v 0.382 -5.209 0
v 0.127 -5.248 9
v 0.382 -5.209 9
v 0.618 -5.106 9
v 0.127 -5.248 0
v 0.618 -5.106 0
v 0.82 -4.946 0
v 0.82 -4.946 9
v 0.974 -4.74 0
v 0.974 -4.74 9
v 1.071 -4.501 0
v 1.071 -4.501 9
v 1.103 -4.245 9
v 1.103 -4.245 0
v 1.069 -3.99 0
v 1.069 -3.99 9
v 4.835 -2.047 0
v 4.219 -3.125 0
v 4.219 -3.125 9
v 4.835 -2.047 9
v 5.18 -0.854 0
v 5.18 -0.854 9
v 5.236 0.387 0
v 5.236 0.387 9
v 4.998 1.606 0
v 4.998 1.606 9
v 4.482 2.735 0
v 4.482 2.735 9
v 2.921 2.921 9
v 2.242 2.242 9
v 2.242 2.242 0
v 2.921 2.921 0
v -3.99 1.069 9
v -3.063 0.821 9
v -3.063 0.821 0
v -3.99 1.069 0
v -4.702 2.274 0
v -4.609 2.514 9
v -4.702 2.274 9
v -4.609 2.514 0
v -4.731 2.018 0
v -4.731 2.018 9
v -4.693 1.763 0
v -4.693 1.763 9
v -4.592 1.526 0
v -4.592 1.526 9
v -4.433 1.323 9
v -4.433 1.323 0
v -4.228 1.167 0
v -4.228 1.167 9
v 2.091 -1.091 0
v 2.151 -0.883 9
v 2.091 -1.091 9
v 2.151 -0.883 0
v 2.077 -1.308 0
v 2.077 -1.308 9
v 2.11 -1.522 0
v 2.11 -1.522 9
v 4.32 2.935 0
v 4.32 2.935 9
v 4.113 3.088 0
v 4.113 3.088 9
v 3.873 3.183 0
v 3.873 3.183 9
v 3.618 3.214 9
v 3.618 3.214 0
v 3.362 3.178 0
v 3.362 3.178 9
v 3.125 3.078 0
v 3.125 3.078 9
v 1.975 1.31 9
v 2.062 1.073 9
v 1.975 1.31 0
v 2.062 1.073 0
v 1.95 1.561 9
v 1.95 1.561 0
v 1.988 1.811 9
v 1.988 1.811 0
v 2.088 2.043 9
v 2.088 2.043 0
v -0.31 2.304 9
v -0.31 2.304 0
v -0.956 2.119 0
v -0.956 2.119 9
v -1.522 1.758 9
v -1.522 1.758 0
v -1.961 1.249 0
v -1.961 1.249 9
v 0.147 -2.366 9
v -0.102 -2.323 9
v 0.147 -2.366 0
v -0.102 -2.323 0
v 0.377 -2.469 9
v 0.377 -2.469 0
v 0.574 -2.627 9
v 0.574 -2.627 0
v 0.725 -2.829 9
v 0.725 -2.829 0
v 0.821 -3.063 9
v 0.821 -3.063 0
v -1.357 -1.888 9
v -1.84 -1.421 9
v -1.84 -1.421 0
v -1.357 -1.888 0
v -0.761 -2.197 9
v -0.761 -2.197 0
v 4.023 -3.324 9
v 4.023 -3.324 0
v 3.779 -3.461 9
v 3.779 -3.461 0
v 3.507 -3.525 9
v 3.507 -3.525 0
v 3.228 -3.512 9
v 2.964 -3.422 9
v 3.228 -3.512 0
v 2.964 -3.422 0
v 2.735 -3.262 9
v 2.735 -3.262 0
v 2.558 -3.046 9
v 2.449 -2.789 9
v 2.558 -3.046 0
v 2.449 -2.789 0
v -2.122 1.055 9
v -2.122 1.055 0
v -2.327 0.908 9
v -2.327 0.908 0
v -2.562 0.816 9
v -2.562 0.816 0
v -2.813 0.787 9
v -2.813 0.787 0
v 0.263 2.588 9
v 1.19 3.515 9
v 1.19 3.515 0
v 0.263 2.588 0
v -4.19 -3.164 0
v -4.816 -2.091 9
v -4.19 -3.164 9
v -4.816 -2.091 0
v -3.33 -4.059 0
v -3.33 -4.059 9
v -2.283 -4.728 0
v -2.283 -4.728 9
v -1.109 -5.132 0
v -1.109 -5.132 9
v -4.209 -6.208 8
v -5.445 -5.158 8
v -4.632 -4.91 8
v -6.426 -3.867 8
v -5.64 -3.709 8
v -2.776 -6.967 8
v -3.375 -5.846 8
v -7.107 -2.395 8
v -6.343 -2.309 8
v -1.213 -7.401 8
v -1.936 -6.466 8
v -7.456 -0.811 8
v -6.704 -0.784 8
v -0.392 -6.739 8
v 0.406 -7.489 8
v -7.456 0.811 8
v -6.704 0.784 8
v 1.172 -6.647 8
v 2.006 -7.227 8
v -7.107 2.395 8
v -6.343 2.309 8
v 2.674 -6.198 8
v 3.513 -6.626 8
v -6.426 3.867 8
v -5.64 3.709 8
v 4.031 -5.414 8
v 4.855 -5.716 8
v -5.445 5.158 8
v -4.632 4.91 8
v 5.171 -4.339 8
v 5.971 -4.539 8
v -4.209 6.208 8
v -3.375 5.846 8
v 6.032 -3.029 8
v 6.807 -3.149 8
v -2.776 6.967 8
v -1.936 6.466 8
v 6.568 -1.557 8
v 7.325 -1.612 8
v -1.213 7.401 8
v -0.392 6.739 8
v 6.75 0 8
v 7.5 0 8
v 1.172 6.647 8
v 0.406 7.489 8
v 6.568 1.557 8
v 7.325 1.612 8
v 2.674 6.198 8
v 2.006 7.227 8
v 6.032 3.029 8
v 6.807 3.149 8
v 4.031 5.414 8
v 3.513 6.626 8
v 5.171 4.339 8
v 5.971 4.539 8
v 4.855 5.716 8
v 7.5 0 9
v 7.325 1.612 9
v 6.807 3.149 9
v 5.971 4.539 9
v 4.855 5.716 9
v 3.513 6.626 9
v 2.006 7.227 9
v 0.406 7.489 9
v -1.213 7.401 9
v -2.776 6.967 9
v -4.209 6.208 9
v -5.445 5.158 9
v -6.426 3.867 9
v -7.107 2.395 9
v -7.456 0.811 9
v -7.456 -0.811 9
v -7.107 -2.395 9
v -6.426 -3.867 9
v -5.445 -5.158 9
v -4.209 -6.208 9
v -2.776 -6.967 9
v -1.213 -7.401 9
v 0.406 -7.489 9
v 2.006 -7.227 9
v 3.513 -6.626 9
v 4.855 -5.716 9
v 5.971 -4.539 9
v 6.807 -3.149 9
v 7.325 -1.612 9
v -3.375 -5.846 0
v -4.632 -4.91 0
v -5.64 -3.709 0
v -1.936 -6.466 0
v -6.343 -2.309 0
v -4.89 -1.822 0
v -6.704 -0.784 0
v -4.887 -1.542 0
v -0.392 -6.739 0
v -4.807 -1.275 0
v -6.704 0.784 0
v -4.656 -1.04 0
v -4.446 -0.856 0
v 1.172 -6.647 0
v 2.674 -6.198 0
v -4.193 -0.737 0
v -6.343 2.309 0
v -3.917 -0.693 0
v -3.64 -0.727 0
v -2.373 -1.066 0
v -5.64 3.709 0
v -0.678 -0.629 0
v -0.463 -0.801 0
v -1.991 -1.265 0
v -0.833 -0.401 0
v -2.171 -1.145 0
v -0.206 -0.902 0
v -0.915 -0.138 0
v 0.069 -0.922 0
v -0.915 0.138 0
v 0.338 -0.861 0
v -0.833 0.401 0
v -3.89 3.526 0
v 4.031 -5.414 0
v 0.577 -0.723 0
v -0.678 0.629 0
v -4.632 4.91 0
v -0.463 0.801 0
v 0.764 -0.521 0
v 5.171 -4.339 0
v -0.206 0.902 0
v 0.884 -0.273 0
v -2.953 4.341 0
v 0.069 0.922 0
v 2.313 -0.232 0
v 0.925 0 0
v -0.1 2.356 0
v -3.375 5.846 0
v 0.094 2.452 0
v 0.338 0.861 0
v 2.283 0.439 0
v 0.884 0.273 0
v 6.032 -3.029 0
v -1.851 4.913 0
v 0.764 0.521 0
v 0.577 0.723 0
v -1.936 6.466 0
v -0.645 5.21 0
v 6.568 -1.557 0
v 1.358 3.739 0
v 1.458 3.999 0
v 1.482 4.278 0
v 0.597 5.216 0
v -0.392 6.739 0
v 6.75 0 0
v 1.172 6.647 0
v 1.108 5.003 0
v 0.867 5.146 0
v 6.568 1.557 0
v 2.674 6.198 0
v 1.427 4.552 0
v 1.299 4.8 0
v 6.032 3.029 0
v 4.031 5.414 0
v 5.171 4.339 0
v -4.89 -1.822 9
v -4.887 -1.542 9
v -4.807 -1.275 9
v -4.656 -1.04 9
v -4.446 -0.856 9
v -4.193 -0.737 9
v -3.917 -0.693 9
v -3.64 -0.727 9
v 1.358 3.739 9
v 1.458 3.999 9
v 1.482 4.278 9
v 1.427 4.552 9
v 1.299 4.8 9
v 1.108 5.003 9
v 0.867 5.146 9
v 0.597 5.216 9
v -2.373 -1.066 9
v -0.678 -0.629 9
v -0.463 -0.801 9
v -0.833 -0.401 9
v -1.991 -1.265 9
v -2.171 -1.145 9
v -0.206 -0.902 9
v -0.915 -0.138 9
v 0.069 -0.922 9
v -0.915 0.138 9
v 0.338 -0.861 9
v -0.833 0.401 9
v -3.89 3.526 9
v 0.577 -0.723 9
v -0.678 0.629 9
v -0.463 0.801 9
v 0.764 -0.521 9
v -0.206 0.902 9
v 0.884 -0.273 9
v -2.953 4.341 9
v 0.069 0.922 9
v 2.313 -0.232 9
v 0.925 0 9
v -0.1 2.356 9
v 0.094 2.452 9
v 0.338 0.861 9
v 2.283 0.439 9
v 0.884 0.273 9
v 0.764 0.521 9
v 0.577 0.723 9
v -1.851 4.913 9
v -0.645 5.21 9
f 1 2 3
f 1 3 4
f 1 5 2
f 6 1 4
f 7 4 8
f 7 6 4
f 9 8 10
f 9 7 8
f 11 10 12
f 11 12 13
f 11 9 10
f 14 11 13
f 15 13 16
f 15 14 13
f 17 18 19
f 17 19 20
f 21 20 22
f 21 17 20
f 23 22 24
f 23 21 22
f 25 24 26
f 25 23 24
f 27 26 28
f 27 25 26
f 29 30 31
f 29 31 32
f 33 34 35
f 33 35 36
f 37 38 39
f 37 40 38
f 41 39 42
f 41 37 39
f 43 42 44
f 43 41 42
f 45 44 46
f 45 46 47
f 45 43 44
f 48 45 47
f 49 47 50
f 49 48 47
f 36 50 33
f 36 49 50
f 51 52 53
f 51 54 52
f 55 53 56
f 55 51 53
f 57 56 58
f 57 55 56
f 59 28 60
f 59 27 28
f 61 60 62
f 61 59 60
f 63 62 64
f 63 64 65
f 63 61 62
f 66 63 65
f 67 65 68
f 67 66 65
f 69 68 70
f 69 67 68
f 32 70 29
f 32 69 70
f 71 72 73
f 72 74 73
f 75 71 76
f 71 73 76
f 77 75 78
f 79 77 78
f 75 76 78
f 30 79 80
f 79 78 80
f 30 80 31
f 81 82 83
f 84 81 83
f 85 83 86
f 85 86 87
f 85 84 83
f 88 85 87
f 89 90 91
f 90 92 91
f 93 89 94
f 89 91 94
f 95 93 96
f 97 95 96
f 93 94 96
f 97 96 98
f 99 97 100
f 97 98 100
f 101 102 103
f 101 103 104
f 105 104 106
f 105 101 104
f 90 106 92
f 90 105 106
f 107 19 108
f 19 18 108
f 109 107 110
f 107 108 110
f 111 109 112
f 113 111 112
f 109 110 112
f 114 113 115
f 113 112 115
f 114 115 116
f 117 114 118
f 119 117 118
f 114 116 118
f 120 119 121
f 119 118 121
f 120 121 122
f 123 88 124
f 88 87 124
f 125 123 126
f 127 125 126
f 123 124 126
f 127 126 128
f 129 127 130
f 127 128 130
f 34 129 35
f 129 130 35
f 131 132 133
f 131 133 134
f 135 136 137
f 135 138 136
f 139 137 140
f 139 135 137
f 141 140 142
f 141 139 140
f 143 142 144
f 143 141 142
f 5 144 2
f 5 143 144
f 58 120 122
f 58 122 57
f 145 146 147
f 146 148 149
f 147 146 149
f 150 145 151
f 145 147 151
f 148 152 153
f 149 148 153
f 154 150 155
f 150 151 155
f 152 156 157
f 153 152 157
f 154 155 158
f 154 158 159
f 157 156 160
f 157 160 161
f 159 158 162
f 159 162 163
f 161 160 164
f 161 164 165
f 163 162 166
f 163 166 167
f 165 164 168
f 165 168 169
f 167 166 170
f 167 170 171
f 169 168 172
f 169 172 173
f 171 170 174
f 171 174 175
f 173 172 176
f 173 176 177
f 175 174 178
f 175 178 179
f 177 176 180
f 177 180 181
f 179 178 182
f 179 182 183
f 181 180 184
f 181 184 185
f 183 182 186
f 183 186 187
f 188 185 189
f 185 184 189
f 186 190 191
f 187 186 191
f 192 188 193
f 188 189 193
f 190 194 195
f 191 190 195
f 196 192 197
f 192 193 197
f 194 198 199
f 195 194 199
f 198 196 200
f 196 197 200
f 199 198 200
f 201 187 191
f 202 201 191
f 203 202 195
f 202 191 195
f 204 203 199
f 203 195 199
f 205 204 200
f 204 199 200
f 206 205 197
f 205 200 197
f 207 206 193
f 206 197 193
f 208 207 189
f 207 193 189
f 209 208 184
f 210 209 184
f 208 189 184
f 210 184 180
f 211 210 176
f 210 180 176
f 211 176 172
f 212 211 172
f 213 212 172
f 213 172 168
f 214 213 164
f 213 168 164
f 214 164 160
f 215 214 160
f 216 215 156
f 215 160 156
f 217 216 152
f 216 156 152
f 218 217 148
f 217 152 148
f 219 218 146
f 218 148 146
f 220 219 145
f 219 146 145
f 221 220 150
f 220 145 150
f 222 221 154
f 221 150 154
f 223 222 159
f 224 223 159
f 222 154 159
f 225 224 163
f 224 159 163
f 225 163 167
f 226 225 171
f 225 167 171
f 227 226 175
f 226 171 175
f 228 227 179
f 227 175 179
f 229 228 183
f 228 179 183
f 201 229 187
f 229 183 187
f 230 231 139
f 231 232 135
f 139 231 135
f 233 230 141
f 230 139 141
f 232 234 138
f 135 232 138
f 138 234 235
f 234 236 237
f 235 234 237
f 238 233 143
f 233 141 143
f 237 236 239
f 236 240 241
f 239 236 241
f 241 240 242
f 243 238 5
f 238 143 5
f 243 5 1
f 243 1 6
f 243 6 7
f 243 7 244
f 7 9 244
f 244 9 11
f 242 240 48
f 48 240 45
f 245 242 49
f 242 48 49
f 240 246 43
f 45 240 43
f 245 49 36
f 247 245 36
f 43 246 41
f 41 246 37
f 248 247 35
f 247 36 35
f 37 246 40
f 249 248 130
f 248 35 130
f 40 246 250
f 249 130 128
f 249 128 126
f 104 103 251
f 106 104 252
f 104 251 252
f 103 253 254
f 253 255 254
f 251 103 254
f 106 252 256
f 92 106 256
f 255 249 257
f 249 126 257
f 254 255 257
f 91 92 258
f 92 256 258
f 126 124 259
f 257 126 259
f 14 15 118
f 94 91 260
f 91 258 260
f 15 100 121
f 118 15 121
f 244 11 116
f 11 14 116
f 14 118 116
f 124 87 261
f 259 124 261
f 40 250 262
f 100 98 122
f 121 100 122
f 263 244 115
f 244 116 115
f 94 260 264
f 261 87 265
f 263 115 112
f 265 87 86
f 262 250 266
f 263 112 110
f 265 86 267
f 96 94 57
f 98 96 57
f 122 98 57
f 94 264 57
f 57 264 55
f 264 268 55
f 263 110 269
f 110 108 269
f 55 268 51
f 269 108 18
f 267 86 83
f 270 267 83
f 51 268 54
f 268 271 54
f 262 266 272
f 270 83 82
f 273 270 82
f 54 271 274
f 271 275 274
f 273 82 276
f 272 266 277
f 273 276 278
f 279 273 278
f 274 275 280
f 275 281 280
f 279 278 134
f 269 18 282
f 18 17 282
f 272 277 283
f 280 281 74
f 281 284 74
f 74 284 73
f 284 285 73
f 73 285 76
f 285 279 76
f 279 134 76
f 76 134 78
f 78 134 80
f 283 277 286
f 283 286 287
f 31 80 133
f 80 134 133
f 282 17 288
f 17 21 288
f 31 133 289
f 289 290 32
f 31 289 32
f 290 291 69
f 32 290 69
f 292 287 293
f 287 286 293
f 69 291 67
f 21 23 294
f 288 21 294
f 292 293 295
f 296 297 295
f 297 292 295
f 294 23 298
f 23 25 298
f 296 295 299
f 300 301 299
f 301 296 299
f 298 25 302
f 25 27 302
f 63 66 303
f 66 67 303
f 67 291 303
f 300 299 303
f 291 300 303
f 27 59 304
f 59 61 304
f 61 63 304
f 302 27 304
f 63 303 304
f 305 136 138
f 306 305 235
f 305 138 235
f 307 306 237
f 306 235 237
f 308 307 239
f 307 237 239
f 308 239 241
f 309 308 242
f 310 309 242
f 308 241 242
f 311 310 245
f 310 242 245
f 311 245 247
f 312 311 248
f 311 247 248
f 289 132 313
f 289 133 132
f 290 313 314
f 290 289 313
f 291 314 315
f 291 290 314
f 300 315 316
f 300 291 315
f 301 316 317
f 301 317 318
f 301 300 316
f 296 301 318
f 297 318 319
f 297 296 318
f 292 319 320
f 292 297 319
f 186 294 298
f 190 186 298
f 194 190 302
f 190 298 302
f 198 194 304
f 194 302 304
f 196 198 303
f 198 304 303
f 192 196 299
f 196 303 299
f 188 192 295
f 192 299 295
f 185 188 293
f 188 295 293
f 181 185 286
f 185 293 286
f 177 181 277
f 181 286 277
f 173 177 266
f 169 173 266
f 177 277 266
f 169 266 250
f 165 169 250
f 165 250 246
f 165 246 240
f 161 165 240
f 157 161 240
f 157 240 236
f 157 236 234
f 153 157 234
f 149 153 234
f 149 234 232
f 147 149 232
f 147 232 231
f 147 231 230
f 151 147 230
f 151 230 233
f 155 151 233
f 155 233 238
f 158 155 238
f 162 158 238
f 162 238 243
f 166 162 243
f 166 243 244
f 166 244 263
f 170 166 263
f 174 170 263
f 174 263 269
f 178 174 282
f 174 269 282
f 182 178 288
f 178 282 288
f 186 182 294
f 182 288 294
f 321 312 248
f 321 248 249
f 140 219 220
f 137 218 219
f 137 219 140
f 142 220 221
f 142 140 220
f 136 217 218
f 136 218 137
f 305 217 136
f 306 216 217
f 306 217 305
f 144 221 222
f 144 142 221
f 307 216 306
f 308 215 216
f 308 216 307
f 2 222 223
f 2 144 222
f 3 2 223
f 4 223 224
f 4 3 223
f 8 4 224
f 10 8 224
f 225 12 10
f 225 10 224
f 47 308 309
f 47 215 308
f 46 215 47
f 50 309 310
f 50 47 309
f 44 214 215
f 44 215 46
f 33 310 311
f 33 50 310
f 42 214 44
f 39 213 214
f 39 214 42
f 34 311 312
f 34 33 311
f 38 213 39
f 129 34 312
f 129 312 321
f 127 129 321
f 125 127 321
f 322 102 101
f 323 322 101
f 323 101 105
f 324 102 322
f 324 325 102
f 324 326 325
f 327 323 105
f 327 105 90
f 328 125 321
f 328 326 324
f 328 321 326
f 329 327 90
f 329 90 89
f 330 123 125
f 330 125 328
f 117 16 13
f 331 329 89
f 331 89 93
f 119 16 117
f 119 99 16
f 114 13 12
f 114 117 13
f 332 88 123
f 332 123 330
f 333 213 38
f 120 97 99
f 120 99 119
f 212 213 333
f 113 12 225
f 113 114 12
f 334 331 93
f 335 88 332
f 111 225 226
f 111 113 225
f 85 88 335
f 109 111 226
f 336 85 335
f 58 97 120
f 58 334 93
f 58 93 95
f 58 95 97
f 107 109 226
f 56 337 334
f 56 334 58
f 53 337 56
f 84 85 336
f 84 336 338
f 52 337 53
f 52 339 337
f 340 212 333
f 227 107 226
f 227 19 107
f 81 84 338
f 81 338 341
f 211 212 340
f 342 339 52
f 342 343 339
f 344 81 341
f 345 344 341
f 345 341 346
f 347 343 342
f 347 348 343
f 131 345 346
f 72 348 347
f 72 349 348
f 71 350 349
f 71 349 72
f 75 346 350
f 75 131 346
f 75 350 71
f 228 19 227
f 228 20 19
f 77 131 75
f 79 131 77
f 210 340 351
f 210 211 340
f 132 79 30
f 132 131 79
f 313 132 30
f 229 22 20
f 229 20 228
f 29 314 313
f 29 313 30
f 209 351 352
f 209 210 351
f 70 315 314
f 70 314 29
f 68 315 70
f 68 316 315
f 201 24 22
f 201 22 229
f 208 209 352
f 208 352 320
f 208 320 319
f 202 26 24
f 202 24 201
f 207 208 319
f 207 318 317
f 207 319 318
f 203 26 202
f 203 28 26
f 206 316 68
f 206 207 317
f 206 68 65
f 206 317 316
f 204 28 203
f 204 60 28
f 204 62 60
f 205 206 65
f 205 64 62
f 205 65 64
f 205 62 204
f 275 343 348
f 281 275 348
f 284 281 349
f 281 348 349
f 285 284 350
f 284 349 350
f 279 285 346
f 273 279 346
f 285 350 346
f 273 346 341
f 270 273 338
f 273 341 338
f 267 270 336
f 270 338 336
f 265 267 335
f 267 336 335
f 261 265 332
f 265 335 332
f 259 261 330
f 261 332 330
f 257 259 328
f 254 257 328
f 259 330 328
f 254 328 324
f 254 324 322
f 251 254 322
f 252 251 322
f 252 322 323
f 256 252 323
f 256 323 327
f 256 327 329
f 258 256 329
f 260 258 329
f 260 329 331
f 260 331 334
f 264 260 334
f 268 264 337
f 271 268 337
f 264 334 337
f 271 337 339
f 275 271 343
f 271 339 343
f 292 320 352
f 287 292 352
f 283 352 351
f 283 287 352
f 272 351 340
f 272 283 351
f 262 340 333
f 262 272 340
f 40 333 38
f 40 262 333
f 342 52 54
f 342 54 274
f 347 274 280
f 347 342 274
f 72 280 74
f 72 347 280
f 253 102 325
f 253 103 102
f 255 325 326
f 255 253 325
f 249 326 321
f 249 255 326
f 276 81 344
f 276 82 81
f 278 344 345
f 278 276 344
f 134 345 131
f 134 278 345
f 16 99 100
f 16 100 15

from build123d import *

# Parameters (mm, degrees)
SKETCH_1_R      = 6.75
SKETCH_1_R_2    = 5.25
EXTRUDE_1_DEPTH = 9
SKETCH_2_R      = 0.925
EXTRUDE_2_DEPTH = 9
FILLET_1_R      = 1
EXTRUDE_START   = -1
SKETCH_3_R      = 7.5
SKETCH_3_R_2    = 6.75
EXTRUDE_3_DEPTH = 1
FILLET_2_R      = 1


with BuildPart() as part:
    # 草图1 → 凸台-拉伸1 (new body)
    with BuildSketch(Plane.XY):
        Circle(SKETCH_1_R)
        Circle(SKETCH_1_R_2, mode=Mode.SUBTRACT)
    extrude(amount=EXTRUDE_1_DEPTH)

    # 草图2 → 凸台-拉伸2 (add)
    with BuildSketch(Plane.XY.offset(9)):
        with BuildLine():
            ThreePointArc((0, 2.325), (-1.415370322, 1.844546516), (-2.245777546, 0.60175428))
            Line((-2.245777546, 0.60175428), (-5.780506882, 1.548882151))
            Line((-5.780506882, 1.548882151), (-6.206011413, -0.039122381))
            Line((-6.206011413, -0.039122381), (-2.013509064, -1.1625))
            ThreePointArc((-2.013509064, -1.1625), (-0.88973898, -2.148019913), (0.60175428, -2.245777546))
            Line((0.60175428, -2.245777546), (1.548882151, -5.780506882))
            Line((1.548882151, -5.780506882), (3.136886683, -5.35500235))
            Line((3.136886683, -5.35500235), (2.013509064, -1.1625))
            ThreePointArc((2.013509064, -1.1625), (2.305109303, 0.303473397), (1.644023266, 1.644023266))
            Line((1.644023266, 1.644023266), (4.231624731, 4.231624731))
            Line((4.231624731, 4.231624731), (3.069124731, 5.394124731))
            Line((3.069124731, 5.394124731), (0, 2.325))
        make_face()
        Circle(SKETCH_2_R, mode=Mode.SUBTRACT)
    extrude(amount=-EXTRUDE_2_DEPTH)

    # 圆角1
    fillet_1_edges = [part.edges().sort_by_distance(p)[0] for p in [
        (0.60175428, -2.245777546, 4.5),
        (-2.013509064, -1.1625, 4.5),
        (-5.071110588, 1.358799987, 4.5),
        (-2.245777546, 0.60175428, 4.5),
        (0, 2.325, 4.5),
        (3.712310601, 3.712310601, 4.5),
        (1.644023266, 1.644023266, 4.5),
        (2.013509064, -1.1625, 4.5),
        (1.358799987, -5.071110588, 4.5),
    ]]
    fillet(fillet_1_edges, radius=FILLET_1_R)

    # 草图3 → 凸台-拉伸3 (add)
    with BuildSketch(Plane.XY.offset(9).offset(EXTRUDE_START)):
        Circle(SKETCH_3_R)
        Circle(SKETCH_3_R_2, mode=Mode.SUBTRACT)
    extrude(amount=EXTRUDE_3_DEPTH)

    # 圆角2
    fillet_2_edges = [part.edges().sort_by_distance(p)[0] for p in [
        (-5.241561446, -0.297545971, 4.5),
        (2.363098353, 4.688098353, 4.5),
        (2.878463093, -4.390552382, 4.5),
    ]]
    fillet(fillet_2_edges, radius=FILLET_2_R)


solid = part.part
